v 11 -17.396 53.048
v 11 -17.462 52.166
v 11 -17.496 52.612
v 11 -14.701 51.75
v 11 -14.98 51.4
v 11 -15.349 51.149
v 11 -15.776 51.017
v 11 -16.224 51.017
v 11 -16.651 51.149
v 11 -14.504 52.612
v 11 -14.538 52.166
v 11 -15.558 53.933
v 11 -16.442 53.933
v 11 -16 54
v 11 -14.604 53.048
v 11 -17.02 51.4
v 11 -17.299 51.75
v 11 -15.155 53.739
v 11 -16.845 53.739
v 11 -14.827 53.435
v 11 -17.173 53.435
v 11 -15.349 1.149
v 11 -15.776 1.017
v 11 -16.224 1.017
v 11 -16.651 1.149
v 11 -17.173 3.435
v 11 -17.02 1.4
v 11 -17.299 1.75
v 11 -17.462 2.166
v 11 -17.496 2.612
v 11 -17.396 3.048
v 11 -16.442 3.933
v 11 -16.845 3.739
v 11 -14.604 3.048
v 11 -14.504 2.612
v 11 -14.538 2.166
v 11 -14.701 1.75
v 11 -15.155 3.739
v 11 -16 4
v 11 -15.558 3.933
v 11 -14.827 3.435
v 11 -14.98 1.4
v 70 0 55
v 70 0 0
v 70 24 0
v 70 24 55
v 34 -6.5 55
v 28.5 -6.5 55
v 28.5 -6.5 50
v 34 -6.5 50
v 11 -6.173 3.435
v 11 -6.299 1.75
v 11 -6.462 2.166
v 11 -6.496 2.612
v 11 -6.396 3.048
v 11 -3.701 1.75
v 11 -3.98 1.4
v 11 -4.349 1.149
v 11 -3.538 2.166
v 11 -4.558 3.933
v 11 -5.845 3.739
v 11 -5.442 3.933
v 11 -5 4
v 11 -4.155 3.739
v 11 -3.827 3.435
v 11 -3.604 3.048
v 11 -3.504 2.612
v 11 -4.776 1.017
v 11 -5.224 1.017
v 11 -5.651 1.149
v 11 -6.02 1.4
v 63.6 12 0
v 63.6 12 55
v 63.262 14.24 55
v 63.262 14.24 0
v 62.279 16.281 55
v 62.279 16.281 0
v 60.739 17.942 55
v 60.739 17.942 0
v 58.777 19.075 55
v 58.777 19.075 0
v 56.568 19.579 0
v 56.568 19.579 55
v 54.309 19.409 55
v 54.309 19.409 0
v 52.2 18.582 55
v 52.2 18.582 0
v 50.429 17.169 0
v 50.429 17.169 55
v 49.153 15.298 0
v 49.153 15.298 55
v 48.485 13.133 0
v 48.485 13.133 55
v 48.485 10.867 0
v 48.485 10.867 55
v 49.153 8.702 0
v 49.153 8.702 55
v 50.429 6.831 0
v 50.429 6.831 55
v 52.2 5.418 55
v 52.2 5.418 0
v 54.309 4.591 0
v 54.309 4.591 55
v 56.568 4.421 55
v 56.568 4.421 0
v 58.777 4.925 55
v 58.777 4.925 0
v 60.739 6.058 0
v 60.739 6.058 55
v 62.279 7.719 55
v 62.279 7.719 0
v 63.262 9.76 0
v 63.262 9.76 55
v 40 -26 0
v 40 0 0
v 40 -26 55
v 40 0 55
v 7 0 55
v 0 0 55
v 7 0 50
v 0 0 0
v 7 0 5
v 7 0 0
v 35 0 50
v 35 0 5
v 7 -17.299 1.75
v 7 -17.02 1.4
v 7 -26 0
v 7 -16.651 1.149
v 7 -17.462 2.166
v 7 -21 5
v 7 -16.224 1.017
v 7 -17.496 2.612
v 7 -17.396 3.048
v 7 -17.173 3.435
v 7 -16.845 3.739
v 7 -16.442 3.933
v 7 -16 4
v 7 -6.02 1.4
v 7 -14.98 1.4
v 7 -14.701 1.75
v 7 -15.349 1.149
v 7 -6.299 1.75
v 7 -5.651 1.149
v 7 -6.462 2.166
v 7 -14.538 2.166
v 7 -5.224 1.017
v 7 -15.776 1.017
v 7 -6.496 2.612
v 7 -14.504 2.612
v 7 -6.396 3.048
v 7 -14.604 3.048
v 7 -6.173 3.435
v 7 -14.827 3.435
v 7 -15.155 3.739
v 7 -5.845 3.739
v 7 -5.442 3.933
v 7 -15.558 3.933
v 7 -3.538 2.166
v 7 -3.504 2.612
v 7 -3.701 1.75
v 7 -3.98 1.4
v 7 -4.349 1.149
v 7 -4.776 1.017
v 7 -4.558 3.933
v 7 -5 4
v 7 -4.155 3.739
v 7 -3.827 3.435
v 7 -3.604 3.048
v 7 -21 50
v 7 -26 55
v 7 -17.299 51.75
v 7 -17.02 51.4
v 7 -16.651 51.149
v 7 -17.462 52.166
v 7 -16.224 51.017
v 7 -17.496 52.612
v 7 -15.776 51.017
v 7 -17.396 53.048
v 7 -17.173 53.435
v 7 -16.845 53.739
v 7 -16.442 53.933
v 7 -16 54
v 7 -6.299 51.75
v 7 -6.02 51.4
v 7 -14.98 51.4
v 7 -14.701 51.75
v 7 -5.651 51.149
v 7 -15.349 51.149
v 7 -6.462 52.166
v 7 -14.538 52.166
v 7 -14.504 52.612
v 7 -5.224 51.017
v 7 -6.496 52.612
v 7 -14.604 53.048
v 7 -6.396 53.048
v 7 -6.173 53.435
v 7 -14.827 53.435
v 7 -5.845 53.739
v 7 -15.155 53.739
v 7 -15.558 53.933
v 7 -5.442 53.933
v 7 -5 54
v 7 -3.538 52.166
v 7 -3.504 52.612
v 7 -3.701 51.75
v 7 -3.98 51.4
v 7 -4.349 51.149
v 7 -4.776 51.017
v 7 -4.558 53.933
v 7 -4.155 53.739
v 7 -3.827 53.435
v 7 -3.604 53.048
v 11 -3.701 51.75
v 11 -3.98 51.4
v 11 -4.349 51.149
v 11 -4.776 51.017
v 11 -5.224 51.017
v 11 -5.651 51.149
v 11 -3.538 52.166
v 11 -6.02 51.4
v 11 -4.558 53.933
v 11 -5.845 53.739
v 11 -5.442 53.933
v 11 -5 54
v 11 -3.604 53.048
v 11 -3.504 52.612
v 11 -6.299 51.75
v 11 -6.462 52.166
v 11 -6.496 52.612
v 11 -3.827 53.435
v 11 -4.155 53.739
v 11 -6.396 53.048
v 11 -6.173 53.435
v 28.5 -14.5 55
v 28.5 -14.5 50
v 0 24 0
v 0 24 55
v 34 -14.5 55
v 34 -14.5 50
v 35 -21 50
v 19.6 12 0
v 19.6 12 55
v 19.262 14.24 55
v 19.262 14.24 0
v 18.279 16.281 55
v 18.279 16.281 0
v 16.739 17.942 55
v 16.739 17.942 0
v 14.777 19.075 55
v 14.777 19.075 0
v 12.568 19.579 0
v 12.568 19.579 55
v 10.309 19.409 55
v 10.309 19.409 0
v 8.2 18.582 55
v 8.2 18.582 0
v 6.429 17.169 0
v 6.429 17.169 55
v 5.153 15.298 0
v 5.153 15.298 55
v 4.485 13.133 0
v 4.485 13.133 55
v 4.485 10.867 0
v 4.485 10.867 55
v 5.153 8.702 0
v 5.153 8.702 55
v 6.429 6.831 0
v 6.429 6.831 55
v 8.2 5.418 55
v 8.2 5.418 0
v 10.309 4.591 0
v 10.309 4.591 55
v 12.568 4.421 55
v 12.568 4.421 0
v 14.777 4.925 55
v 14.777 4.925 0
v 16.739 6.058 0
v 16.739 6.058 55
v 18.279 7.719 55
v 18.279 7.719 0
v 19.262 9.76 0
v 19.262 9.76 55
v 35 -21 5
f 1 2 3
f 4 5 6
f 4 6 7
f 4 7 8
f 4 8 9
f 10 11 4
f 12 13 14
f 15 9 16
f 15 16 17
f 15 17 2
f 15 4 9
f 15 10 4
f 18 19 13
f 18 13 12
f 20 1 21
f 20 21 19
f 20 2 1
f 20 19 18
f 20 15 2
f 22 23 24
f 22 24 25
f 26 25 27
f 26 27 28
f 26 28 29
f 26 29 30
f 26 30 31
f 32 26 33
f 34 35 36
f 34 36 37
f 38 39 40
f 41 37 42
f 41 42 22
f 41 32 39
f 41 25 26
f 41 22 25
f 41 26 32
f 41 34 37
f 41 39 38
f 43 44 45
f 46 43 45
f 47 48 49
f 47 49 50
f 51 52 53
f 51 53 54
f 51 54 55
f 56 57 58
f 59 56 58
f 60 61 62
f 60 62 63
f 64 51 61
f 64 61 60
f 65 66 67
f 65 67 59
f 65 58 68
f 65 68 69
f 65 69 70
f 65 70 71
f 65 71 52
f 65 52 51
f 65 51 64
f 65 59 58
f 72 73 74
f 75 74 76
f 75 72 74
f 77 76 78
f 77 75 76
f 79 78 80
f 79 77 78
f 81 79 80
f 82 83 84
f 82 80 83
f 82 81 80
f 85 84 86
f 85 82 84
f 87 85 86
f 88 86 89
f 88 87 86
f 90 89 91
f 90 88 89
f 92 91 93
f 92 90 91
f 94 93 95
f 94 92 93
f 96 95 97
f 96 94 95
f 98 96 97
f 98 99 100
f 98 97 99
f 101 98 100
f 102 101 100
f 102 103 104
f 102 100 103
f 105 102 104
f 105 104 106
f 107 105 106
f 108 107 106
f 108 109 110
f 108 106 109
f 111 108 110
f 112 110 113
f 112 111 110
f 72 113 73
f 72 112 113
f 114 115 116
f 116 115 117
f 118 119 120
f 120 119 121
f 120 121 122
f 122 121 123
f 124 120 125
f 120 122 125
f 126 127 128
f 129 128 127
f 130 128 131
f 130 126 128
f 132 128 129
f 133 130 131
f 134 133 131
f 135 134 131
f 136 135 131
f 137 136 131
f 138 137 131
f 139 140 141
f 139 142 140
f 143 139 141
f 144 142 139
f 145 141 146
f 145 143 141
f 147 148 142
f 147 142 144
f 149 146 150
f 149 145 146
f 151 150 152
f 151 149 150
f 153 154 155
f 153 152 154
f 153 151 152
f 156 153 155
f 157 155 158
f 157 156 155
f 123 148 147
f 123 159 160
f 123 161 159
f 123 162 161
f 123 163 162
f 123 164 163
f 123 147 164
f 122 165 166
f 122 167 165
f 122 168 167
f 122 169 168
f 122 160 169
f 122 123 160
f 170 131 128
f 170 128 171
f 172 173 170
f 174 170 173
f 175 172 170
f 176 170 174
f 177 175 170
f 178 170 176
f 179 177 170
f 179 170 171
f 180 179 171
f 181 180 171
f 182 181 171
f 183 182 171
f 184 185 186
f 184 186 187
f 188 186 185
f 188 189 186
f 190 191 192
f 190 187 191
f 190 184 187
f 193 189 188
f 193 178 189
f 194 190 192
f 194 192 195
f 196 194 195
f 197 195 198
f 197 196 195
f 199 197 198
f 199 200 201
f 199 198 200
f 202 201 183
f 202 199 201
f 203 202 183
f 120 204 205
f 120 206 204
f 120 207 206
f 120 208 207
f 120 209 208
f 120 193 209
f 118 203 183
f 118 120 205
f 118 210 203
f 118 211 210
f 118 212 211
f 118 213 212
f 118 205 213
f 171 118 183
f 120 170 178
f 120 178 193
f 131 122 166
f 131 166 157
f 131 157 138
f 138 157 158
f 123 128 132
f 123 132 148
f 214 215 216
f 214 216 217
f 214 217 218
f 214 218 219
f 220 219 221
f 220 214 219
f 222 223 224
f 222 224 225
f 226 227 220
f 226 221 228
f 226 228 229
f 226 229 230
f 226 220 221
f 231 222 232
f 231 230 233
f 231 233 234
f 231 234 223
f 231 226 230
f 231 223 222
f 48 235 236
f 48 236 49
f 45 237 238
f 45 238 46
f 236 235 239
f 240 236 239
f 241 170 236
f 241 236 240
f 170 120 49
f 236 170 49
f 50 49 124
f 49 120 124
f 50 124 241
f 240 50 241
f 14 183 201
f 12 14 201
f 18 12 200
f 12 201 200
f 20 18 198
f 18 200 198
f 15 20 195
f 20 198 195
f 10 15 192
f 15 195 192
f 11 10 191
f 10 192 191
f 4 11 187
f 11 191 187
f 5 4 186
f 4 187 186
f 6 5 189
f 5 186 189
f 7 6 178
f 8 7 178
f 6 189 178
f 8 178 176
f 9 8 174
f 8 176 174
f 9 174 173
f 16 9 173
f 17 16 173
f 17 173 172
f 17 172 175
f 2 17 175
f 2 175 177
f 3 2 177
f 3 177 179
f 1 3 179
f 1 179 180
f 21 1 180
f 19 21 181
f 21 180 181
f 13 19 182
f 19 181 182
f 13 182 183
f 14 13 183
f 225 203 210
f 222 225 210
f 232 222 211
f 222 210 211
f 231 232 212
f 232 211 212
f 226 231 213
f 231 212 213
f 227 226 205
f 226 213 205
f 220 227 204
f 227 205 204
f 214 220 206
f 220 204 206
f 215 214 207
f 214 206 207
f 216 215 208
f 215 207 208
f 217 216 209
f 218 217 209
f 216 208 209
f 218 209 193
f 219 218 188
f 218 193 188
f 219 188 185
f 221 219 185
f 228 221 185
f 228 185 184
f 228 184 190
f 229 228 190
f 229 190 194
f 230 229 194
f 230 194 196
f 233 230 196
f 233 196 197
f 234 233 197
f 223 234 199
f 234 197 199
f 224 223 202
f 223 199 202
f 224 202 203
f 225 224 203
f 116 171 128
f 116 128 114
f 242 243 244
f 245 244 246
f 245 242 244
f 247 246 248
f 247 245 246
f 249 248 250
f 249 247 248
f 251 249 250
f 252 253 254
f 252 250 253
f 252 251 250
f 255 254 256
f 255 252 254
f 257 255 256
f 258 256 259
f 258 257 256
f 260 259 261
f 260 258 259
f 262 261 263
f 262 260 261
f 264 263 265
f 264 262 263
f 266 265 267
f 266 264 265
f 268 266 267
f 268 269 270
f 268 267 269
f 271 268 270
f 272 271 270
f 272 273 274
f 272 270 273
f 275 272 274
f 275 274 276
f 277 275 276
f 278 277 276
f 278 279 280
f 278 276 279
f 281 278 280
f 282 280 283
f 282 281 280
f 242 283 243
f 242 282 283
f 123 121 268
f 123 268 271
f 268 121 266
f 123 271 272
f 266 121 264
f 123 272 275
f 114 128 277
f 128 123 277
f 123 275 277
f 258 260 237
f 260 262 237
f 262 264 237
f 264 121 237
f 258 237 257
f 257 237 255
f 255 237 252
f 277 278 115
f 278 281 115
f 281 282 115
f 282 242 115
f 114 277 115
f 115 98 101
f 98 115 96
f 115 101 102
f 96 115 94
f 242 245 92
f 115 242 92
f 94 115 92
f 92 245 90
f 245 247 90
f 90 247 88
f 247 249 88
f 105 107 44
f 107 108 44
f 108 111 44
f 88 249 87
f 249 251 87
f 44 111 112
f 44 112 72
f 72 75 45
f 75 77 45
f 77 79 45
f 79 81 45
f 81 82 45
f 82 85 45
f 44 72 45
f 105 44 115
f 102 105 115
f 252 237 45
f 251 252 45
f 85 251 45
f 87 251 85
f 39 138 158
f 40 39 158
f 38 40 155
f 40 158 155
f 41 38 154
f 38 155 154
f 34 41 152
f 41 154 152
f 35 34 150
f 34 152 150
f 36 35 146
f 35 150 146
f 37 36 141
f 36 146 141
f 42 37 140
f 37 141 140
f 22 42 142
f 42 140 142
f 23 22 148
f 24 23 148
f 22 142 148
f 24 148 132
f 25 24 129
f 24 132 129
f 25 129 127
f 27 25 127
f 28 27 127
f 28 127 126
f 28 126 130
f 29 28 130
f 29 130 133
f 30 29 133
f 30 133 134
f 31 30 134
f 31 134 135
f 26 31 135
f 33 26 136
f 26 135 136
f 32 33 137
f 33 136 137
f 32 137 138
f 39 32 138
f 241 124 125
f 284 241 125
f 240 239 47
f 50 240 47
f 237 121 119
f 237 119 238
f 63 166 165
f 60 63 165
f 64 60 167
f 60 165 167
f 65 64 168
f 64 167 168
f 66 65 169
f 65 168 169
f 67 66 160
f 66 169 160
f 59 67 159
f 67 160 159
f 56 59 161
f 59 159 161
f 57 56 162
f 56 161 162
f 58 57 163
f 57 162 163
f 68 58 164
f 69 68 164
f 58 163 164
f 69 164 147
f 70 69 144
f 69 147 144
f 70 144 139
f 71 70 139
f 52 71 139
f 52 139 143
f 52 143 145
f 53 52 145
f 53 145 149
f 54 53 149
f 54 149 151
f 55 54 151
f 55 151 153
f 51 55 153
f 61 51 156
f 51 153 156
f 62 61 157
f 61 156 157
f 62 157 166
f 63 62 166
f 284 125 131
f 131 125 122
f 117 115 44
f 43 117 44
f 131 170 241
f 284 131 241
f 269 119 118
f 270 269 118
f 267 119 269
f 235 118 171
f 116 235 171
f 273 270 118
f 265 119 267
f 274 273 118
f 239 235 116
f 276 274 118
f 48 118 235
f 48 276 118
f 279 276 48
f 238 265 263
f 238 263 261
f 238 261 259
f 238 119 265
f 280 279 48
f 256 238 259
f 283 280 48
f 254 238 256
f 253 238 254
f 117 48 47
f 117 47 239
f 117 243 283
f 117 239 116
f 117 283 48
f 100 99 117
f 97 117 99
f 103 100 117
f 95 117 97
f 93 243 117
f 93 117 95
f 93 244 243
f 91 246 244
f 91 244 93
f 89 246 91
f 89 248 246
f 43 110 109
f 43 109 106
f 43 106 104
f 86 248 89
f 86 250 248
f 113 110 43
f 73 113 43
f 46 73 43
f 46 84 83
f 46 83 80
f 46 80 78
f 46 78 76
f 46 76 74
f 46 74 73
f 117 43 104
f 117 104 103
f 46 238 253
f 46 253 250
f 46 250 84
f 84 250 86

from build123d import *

# Parameters (mm, degrees)
ESQUISSE1_W             = 70
ESQUISSE1_H             = 24
BOSS_EXTRU_1_DEPTH      = 55
ESQUISSE2_R             = 7.6
ENL_V_MAT_EXTRU_1_DEPTH = 93.200867675
BOSS_EXTRU_3_DEPTH      = 21
ESQUISSE9_W             = 33
ESQUISSE9_H             = 55
BOSS_EXTRU_4_DEPTH      = 5
ESQUISSE10_R            = 1.5
ENL_V_MAT_EXTRU_4_DEPTH = 4
ESQUISSE11_W            = 5.5
ESQUISSE11_H            = 8
ENL_V_MAT_EXTRU_5_DEPTH = 10


with BuildPart() as part:
    # Esquisse1 → Boss.-Extru.1 (new body)
    with BuildSketch(Plane.XY):
        with Locations((35, 12)):
            Rectangle(ESQUISSE1_W, ESQUISSE1_H)
    extrude(amount=BOSS_EXTRU_1_DEPTH)

    # Esquisse2 → Enlèv. mat.-Extru.1 (cut, through all)
    with BuildSketch(Plane.XY):
        with Locations((56, 12)):
            Circle(ESQUISSE2_R)
        with Locations((12, 12)):
            Circle(ESQUISSE2_R)
    extrude(amount=ENL_V_MAT_EXTRU_1_DEPTH, mode=Mode.SUBTRACT)

    # Esquisse6 → Boss.-Extru.3 (add)
    with BuildSketch(Plane.XZ):
        Polygon((7, 0), (40, 0), (40, 55), (7, 55), (7, 50), (35, 50), (35, 5), (7, 5), align=None)
    extrude(amount=BOSS_EXTRU_3_DEPTH)

    # Esquisse9 → Boss.-Extru.4 (add)
    with BuildSketch(Plane.XZ.offset(21)):
        with Locations((23.5, 27.5)):
            Rectangle(ESQUISSE9_W, ESQUISSE9_H)
    extrude(amount=BOSS_EXTRU_4_DEPTH)

    # Esquisse10 → Enlèv. mat.-Extru.4 (cut)
    with BuildSketch(Plane.ZY.offset(-7)):
        with Locations((52.5, -16)):
            Circle(ESQUISSE10_R)
        with Locations((52.5, -5)):
            Circle(ESQUISSE10_R)
        with Locations((2.5, -16)):
            Circle(ESQUISSE10_R)
        with Locations((2.5, -5)):
            Circle(ESQUISSE10_R)
    extrude(amount=-ENL_V_MAT_EXTRU_4_DEPTH, mode=Mode.SUBTRACT)

    # Esquisse11 → Enlèv. mat.-Extru.5 (cut)
    with BuildSketch(Plane.XY.offset(55)):
        with Locations((31.25, -10.5)):
            Rectangle(ESQUISSE11_W, ESQUISSE11_H)
    extrude(amount=-ENL_V_MAT_EXTRU_5_DEPTH, mode=Mode.SUBTRACT)


solid = part.part
